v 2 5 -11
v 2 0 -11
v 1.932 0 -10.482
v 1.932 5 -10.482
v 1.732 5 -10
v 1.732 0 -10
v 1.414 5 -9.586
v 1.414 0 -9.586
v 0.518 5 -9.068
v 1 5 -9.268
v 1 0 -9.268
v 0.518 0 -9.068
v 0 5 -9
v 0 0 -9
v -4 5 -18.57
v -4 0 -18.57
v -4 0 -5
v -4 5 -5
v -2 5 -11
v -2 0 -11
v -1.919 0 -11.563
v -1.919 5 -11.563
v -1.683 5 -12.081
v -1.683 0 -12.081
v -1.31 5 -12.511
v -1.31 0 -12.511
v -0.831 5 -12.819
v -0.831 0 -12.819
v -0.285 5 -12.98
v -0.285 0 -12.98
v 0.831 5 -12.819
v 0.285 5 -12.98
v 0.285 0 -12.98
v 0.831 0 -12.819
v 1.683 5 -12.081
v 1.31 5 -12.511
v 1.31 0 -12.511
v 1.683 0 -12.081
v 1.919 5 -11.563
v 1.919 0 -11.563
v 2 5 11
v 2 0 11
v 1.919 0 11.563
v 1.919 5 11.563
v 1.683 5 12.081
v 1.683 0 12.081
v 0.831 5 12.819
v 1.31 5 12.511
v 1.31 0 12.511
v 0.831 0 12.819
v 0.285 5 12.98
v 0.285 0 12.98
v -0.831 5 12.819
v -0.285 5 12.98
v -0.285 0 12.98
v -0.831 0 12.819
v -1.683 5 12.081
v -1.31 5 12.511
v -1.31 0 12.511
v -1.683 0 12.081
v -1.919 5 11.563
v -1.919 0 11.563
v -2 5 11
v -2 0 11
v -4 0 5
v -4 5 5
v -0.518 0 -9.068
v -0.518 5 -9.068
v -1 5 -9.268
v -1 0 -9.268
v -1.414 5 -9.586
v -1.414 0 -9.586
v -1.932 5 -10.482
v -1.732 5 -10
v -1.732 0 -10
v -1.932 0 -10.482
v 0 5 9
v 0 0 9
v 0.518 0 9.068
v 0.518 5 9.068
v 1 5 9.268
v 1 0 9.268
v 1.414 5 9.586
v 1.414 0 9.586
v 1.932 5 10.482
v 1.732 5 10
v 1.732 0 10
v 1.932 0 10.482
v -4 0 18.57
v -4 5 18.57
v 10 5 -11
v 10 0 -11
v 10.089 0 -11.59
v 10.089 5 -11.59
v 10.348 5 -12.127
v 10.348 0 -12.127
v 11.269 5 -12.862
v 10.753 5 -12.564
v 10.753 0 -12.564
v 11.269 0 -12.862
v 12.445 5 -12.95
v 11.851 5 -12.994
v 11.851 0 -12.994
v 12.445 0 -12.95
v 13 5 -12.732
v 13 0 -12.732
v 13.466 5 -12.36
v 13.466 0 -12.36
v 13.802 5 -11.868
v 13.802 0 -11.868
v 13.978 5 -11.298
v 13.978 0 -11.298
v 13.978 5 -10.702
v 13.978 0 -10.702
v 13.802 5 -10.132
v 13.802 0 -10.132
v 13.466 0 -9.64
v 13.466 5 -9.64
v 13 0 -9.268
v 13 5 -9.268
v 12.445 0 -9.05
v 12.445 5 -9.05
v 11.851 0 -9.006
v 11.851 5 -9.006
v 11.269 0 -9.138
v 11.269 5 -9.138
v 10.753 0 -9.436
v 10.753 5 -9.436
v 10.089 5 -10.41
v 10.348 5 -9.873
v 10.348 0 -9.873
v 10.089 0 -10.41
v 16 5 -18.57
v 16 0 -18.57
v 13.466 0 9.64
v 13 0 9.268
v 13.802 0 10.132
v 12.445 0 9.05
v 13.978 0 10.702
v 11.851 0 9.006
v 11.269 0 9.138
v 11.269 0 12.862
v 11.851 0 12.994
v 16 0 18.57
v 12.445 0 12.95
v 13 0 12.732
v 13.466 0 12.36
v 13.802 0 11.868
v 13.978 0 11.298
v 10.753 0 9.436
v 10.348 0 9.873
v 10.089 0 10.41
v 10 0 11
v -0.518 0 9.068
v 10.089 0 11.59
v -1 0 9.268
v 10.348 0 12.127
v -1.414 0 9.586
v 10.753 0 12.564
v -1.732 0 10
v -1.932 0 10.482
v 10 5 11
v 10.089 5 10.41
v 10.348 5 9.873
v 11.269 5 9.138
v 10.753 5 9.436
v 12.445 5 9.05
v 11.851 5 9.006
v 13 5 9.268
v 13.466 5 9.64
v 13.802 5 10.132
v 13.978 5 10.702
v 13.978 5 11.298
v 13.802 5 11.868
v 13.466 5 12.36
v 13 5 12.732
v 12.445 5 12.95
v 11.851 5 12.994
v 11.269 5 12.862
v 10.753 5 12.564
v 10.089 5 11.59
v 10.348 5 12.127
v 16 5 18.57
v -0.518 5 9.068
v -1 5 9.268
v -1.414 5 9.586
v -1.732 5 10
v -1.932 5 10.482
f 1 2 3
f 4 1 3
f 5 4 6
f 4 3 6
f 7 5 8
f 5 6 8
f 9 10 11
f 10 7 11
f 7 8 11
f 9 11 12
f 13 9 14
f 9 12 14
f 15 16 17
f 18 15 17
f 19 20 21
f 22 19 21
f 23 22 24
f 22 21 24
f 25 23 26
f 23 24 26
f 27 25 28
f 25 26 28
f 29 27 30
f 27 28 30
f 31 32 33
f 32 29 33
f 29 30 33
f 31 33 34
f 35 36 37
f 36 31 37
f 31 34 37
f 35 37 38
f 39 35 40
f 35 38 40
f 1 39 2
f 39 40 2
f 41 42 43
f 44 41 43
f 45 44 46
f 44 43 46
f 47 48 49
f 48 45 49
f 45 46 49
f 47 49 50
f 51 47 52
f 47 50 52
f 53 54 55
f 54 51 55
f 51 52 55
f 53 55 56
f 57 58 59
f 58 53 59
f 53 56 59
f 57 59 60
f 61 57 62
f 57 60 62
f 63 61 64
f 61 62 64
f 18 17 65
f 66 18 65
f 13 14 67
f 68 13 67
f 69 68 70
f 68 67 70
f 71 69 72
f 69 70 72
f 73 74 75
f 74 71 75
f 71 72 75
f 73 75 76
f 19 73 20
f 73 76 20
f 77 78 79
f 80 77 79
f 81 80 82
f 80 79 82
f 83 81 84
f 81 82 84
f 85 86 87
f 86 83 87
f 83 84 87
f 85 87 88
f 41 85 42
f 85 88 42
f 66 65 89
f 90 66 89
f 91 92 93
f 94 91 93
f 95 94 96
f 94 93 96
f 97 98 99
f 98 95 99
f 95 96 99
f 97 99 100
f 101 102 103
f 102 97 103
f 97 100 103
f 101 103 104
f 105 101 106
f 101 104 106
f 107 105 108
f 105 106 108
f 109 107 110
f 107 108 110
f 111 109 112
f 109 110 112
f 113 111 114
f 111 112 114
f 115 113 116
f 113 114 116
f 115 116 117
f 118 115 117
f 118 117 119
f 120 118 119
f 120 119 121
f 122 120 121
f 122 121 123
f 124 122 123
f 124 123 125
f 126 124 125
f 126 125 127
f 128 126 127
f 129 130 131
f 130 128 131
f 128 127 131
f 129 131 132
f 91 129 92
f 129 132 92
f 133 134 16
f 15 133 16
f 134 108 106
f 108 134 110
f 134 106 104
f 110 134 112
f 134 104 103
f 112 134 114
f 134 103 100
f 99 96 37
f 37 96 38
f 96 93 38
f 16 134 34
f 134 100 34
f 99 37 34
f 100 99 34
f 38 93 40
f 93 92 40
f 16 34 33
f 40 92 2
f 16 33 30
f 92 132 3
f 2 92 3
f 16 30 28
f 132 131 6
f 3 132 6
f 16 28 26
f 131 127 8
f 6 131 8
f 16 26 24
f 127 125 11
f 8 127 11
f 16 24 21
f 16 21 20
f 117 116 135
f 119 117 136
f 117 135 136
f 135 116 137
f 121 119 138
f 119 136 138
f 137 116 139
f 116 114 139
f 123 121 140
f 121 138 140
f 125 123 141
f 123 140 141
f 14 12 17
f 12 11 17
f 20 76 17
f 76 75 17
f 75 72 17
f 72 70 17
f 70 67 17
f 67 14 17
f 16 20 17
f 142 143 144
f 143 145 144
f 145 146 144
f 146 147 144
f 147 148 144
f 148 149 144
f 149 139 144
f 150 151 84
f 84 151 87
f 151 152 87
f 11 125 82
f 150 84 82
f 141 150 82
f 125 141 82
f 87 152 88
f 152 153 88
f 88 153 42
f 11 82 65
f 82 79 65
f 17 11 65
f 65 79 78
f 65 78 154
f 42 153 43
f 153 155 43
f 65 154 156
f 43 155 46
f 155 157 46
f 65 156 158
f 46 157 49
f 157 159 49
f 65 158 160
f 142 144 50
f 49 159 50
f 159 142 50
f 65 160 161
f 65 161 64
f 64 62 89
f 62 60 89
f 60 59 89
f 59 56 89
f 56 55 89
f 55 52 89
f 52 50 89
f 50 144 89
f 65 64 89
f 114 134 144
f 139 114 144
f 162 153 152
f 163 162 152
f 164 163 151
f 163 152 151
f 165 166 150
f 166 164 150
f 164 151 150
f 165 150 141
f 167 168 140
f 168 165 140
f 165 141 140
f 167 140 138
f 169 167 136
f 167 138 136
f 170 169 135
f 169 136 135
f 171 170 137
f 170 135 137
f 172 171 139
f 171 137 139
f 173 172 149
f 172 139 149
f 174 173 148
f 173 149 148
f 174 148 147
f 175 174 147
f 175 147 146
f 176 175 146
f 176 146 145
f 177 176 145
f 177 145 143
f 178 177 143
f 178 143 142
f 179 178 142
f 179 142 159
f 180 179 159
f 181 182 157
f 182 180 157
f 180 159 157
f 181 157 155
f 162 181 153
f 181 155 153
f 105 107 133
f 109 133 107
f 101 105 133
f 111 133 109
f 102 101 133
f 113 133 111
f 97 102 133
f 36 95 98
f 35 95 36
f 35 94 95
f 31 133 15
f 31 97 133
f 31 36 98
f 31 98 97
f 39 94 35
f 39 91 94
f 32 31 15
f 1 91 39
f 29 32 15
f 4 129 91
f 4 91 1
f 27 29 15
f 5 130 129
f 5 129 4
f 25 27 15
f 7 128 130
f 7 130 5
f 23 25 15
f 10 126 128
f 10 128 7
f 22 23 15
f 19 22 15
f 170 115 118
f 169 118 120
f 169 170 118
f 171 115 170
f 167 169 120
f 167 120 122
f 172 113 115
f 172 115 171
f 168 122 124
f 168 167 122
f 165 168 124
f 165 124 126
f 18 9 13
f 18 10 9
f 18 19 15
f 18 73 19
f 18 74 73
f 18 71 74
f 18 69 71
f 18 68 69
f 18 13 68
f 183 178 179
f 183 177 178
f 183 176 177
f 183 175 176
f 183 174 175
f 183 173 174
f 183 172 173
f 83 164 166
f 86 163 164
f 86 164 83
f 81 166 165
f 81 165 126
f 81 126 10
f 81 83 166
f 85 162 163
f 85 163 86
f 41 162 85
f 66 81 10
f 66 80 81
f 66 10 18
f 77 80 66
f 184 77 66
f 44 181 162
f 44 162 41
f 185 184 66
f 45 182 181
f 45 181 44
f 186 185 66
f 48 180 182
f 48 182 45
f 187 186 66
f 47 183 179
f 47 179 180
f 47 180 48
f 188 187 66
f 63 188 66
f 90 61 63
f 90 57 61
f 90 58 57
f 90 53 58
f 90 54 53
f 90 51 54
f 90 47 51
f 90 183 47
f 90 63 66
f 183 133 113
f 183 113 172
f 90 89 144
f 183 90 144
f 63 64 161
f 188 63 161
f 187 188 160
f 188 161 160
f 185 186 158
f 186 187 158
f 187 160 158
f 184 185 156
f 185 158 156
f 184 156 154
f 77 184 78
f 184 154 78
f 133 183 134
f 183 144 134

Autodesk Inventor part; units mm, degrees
ref_plane "YZ Plane" through (0, 0, 0) normal (1, 0, 0) x (0, 1, 0)
ref_plane "XZ Plane" through (0, 0, 0) normal (0, 1, 0) x (-1, 0, 0)
ref_plane "XY Plane" through (0, 0, 0) normal (0, 0, 1) x (1, 0, 0)
sketch "Boceto1" plane through (0, 0, 0) normal (0, 1, 0) x (-1, 0, 0)
  line L0 (4, 5) -> (4, 18.57)
  line L1 (4, 18.57) -> (-16, 18.57)
  line L2 (-16, 18.57) -> (-16, -18.57)
  line L3 (-16, -18.57) -> (4, -18.57)
  line L4 (4, -18.57) -> (4, -5)
  line L5 (0, -5) -> (0, -11)
  line L6 (0, 5) -> (0, 11)
  line L7 (0, -11) -> (-12, -11)
  line L8 (0, 11) -> (-12, 11)
  circle A0 centre (0, 11) radius 2
  circle A1 centre (0, -11) radius 2
  circle A2 centre (-12, -11) radius 2
  circle A3 centre (-12, 11) radius 2
  line L9 (4, -5) -> (4, 5)
  point P0 (0, 0)
  dimension "d0" = 5
  dimension "d1" = 4
  dimension "d2" = 13.57
  dimension "d3" = 20
  dimension "d4" = 37.14
  dimension "d5" = 20
  dimension "d6" = 13.57
  dimension "d7" = 4
  dimension "d8" = 6
  dimension "d9" = 6
  dimension "d11" = 12
  dimension "d12" = 12
  dimension "d13" = 4
  dimension "d14" = 4
  dimension "d15" = 4
  dimension "d16" = 4
extrude "Extrusión1" add sketch "Boceto1" along normal blind 5
equation "\"Radio_pliegue\" = Grosor"
equation "\"Anchura_desahogo_plegado\" = Grosor"
equation "\"Profundidad_desahogo_plegado\" = 0.5 * Grosor"
equation "\"Tamaño_destalonado\" = 4 * Grosor"
equation "\"Remanente_mínimo\" = 2 * Grosor"
equation "\"Radiodetransición\" = Radio_pliegue"
equation "\"Tamaño_de_radio_de_Jacobi\" = Radio_pliegue"
equation "\"TamañoSeparación\" = Grosor"
equation "\"Grosor\" = 0.5"
properties part number "Sujetador"
